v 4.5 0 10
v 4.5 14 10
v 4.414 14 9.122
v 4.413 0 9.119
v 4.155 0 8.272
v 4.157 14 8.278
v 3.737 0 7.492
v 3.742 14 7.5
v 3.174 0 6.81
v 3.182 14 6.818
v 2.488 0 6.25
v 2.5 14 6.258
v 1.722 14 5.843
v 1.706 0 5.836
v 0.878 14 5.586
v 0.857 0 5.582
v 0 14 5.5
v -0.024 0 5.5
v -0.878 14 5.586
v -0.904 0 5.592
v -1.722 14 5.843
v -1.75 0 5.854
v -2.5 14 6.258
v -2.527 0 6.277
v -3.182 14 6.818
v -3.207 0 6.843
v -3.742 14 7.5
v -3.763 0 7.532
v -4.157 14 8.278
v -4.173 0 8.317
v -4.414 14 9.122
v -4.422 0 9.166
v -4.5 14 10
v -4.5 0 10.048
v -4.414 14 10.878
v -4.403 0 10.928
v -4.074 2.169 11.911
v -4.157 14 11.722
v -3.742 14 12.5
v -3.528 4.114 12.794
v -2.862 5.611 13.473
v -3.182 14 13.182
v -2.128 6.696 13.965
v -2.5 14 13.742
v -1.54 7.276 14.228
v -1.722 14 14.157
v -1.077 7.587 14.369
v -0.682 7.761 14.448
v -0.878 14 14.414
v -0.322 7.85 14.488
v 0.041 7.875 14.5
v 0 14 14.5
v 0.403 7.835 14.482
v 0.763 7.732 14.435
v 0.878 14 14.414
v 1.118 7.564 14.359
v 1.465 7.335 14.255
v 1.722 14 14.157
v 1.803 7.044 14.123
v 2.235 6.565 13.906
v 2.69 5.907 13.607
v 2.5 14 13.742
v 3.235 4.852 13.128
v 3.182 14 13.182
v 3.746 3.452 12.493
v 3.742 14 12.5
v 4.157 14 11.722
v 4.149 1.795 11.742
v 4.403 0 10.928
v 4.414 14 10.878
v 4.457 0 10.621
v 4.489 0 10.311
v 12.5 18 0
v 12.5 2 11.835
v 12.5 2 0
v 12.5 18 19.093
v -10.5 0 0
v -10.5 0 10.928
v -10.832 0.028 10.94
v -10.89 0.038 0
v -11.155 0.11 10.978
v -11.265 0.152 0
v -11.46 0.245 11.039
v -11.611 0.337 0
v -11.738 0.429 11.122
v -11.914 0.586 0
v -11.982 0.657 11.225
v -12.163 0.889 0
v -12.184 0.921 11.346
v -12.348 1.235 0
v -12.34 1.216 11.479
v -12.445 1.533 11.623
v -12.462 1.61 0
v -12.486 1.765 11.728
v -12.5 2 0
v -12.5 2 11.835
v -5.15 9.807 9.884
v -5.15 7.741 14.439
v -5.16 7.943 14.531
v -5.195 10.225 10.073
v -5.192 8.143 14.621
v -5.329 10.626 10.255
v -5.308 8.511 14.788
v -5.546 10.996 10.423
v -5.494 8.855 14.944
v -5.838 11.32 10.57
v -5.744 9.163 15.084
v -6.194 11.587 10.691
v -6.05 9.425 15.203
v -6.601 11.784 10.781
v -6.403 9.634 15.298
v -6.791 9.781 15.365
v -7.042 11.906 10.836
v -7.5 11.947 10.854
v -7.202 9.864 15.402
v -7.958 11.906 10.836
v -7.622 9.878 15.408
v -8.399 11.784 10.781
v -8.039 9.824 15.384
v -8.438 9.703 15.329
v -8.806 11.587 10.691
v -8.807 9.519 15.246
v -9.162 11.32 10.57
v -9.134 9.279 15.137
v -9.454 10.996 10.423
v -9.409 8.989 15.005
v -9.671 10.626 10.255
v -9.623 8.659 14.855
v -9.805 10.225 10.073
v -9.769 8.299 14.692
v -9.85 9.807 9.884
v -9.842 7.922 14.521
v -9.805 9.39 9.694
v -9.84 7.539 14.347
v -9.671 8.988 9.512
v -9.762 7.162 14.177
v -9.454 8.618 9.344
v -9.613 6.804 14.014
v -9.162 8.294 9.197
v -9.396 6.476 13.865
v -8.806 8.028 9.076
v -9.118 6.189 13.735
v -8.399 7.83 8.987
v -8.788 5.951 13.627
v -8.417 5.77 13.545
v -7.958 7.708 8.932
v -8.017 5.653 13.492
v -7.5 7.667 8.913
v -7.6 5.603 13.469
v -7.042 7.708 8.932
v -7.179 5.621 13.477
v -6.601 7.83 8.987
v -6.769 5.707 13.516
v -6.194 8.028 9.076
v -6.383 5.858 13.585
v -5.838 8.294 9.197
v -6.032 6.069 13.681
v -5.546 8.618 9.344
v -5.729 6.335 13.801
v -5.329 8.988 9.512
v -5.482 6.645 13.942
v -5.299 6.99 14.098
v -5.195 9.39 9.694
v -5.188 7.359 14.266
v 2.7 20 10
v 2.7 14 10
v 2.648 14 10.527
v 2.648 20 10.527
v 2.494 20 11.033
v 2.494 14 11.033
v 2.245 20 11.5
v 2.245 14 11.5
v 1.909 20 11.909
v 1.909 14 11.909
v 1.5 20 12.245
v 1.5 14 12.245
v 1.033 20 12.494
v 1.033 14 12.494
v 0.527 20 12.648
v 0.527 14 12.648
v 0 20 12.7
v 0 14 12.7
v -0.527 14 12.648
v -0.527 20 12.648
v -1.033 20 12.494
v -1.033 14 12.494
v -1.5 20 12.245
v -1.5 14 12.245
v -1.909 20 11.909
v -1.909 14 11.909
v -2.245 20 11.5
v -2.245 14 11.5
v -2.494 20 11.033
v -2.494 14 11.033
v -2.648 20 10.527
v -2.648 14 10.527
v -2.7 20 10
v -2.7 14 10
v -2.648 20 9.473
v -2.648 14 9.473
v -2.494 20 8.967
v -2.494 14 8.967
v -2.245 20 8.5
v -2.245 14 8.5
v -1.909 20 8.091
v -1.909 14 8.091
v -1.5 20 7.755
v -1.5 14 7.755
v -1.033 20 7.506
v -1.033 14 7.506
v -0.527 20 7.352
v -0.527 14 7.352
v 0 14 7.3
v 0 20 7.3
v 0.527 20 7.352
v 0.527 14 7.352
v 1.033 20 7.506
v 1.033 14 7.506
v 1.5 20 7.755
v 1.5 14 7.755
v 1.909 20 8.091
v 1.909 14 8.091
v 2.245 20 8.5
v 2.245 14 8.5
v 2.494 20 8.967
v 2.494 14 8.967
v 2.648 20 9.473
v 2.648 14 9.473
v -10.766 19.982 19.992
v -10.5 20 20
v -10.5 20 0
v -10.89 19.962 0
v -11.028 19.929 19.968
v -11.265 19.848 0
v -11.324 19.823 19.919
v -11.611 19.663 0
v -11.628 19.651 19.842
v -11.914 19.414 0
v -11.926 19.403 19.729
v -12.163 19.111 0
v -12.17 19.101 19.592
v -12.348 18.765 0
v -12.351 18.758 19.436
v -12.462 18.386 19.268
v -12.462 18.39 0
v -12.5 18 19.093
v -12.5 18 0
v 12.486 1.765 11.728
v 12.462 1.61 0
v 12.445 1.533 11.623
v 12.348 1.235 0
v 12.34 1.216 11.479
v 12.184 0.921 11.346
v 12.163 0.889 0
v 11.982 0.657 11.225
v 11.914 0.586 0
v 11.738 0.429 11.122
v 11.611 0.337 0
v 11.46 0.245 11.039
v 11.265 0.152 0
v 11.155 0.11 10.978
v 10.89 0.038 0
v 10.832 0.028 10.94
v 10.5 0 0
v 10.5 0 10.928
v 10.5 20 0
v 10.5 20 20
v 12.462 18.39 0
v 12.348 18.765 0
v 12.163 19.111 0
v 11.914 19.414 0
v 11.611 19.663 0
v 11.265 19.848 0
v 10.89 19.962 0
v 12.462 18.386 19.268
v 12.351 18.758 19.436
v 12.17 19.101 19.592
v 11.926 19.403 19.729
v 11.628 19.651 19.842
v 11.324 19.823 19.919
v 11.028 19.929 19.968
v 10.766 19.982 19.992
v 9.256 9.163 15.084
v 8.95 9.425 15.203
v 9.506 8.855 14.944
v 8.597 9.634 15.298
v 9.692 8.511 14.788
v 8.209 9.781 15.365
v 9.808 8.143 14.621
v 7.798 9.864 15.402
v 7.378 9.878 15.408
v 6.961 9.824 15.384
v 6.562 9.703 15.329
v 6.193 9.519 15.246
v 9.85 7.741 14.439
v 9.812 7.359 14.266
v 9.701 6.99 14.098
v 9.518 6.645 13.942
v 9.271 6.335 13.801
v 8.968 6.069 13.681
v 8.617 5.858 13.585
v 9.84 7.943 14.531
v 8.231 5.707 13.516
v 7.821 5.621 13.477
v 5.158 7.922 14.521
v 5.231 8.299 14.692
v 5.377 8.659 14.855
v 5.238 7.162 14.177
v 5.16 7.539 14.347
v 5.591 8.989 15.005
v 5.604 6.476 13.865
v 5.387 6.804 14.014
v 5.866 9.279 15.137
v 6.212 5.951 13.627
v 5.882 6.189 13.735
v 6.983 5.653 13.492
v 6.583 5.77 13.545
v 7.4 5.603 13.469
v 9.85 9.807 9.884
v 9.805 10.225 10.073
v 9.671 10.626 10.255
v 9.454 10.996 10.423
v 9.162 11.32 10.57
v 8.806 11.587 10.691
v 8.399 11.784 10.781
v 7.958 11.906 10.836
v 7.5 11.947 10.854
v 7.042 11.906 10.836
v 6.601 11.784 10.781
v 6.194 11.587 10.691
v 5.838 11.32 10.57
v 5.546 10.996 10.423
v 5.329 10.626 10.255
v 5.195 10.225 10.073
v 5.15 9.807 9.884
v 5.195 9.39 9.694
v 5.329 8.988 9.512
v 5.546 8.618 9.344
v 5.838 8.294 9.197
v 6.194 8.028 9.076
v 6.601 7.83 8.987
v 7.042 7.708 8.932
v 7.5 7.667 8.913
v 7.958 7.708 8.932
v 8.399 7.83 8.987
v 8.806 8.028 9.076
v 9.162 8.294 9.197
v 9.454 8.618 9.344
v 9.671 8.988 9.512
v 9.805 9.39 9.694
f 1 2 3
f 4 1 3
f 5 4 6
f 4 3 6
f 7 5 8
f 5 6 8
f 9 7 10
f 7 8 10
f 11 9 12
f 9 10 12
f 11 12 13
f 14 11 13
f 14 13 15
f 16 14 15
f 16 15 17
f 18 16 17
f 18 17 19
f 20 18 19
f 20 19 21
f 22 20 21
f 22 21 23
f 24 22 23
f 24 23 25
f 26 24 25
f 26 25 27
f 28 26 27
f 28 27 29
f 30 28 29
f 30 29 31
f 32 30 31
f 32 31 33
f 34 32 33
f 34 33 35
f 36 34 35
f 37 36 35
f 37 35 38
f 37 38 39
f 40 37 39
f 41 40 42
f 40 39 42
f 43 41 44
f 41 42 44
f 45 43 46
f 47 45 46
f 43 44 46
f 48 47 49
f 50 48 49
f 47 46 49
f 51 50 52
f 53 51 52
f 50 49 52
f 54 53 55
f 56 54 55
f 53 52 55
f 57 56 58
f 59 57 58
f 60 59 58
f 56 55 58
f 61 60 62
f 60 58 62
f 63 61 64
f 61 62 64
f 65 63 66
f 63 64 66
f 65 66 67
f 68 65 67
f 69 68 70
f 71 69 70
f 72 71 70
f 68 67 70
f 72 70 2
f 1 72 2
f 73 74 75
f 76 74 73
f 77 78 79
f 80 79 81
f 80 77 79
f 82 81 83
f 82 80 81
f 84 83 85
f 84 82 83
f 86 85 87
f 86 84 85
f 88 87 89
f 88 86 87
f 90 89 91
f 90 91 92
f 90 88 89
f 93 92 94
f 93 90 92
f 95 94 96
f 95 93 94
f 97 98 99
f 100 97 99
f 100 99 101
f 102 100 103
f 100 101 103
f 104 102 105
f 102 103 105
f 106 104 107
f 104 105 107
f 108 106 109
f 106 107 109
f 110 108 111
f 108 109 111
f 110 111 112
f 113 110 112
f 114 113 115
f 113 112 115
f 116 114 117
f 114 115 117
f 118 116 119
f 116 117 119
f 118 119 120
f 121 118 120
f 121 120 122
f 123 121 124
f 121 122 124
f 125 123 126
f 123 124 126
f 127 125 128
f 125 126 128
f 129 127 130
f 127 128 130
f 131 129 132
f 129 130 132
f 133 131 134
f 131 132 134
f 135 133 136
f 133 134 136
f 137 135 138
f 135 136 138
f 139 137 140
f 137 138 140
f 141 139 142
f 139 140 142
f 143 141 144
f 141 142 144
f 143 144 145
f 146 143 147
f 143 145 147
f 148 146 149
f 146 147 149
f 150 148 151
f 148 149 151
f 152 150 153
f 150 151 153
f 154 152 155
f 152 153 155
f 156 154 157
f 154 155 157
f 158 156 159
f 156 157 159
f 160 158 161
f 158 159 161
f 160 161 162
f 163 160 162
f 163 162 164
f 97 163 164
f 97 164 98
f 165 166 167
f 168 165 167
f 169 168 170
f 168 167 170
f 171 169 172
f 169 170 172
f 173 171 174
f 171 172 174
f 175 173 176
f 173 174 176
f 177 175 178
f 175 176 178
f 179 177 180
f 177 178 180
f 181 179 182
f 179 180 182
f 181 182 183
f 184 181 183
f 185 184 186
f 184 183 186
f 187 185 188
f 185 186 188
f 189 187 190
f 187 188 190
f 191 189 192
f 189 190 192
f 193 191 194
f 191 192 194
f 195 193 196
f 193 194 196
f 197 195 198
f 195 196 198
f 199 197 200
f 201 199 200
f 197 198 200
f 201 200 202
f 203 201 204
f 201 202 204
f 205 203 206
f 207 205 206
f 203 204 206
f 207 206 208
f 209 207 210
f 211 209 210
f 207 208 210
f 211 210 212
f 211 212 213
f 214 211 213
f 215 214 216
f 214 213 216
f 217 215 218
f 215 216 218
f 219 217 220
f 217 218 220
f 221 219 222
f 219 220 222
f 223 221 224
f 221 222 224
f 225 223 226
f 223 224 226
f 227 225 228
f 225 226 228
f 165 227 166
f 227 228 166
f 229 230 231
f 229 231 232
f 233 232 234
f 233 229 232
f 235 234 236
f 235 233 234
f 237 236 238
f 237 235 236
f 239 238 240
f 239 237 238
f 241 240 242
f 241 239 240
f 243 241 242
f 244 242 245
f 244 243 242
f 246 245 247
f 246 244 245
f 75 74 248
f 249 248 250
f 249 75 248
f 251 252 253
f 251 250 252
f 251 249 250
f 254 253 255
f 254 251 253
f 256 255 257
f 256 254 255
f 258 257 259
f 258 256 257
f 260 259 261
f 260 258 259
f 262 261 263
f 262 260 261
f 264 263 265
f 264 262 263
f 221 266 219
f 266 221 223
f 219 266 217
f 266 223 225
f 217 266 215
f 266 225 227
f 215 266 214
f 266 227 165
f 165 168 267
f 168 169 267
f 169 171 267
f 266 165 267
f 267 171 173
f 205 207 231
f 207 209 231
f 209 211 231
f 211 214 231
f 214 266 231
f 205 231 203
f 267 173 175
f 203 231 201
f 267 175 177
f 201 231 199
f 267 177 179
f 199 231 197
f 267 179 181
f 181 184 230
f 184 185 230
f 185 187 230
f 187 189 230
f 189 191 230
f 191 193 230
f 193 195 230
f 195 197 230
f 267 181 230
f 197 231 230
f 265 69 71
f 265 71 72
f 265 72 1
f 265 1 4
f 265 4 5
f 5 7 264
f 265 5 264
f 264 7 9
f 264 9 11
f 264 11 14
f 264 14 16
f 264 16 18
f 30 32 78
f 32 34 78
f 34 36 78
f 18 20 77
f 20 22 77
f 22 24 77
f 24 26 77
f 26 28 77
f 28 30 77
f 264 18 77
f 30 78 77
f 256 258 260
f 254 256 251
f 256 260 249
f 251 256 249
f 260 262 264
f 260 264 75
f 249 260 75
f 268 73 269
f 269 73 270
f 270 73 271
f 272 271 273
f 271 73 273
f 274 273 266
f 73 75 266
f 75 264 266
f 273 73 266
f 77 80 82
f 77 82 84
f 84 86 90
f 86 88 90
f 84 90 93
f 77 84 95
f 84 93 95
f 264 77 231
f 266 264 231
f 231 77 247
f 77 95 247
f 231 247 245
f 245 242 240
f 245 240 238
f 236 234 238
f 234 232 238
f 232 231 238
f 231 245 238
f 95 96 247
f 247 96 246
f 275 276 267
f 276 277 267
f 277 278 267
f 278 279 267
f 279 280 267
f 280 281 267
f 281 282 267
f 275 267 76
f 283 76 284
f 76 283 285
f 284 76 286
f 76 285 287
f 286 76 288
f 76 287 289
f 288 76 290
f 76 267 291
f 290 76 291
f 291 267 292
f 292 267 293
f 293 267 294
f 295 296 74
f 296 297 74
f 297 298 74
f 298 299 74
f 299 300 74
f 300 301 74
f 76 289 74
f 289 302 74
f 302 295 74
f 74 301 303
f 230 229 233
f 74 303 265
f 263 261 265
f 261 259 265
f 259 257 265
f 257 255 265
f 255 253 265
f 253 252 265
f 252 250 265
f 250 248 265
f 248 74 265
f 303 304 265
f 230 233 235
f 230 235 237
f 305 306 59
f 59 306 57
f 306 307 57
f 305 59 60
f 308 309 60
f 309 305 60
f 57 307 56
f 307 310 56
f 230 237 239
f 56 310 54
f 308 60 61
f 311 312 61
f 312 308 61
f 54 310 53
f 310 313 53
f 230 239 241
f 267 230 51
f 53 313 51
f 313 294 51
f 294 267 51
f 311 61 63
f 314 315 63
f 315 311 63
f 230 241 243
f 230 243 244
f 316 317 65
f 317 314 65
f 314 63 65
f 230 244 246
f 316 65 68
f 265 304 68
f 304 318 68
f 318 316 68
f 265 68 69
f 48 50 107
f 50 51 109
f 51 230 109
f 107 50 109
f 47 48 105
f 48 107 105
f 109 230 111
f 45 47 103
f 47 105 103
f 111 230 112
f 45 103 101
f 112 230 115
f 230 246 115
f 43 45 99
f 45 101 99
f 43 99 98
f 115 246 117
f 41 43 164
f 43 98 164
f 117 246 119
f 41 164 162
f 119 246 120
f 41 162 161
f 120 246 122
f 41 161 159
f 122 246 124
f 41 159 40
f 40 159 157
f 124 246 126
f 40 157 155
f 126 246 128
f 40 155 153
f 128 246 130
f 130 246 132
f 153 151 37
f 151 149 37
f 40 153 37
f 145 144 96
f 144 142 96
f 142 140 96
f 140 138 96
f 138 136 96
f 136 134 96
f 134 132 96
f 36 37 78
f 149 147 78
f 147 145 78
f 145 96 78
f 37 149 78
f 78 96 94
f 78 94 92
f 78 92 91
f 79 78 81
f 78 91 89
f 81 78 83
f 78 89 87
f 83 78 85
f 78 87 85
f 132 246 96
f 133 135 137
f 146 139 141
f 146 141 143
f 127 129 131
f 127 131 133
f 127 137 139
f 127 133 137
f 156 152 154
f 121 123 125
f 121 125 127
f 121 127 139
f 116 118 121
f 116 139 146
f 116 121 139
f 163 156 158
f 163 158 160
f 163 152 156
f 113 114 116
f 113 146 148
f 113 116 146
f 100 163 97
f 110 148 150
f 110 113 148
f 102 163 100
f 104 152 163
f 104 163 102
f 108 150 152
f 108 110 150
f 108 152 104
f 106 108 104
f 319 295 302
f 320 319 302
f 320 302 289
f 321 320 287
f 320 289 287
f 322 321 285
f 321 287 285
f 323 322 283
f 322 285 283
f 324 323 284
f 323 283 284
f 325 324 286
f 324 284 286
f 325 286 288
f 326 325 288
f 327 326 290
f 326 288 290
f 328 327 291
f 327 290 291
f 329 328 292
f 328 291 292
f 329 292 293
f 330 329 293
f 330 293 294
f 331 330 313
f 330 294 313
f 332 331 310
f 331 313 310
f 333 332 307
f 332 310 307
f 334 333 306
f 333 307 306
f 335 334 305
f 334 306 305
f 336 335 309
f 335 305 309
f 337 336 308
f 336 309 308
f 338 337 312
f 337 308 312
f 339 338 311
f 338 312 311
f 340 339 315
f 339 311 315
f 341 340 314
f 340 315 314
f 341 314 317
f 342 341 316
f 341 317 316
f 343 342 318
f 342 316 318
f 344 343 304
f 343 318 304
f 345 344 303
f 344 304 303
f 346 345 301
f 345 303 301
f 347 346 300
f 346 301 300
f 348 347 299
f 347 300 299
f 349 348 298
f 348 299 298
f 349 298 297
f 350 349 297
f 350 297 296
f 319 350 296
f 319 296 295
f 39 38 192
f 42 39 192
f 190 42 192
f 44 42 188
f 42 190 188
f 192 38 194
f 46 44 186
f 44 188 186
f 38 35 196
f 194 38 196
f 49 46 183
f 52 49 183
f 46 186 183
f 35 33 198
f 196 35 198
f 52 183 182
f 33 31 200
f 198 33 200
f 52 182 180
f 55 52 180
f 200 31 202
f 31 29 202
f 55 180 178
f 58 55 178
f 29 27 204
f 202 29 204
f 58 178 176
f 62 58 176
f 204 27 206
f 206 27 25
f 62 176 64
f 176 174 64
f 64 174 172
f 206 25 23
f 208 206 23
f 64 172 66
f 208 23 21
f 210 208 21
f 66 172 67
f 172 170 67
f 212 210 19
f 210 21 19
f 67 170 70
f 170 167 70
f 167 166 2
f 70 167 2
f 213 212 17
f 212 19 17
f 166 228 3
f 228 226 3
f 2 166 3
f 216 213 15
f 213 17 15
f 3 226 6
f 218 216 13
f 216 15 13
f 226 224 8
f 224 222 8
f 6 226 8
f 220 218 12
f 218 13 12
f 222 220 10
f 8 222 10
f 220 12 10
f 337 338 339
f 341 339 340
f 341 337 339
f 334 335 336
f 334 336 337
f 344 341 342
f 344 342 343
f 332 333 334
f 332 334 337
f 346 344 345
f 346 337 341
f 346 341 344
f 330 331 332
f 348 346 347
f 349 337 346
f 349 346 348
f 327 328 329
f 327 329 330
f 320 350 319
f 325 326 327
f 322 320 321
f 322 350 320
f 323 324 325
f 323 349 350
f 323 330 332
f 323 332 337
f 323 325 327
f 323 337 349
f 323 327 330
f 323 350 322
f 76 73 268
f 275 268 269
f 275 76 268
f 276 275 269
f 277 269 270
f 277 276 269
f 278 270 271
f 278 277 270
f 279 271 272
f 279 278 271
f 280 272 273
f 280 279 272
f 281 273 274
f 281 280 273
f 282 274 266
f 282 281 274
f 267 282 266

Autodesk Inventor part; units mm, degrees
ref_plane "YZ Plane" through (0, 0, 0) normal (1, 0, 0) x (0, 1, 0)
ref_plane "XZ Plane" through (0, 0, 0) normal (0, 1, 0) x (-1, 0, 0)
sketch "Skizze1" plane through (0, 0, 0) normal (1, 0, 0) x (0, 1, 0)
  line L0 (0, 0) -> (20, 0)
  line L1 (20, 0) -> (20, 20)
  line L2 (20, 20) -> (0, 10.9276)
  line L3 (0, 10.9276) -> (0, 0)
  dimension "d0" = 20
  dimension "d2" = 24.4
  dimension "d18" = 20
extrude "Extrusion1" add sketch "Skizze1" along normal mid plane 25
sketch "Skizze2" plane through (-12.5, 0, 10.9276) normal (0, -0.4131, 0.9107) x (1, 0, 0)
  line L0 (0, 0) -> (0, 21.9615) projected
  line L1 (0, 21.9615) -> (25, 21.9615) projected
  line L2 (25, 21.9615) -> (25, 0) projected
  line L3 (25, 0) -> (0, 0) projected
  line L4 (0, 21.9615) -> (25, 21.9615) projected
  line L5 (12.5, 21.9615) -> (12.5, 0) construction
  line L6 (0, 0) -> (25, 0) projected
  circle A0 centre (5, 8.5) radius 2.35
  circle A1 centre (20, 8.5) radius 2.35
  point P0 (12.5, -4.5142)
  dimension "d5" = 4.7
  dimension "d6" = 15
  dimension "d7" = 8.5
extrude "Extrusion2" cut sketch "Skizze2" against normal blind 5 contours A0 | A1
ref_plane "Arbeitsebene3" through (-12.5, 14, 20) normal (0, 1, 0) x (1, 0, 0)
sketch "Skizze5" plane through (-12.5, 14, 20) normal (0, 1, 0) x (1, 0, 0)
  line L0 (0, 0) -> (25, 0) projected
  line L1 (25, 20) -> (25, 0) projected
  line L2 (25, 20) -> (0, 20) projected
  line L3 (0, 0) -> (0, 20) projected
  line L4 (12.5, 0) -> (12.5, 20) construction
  line L5 (0, 10) -> (25, 10) construction
  circle A0 centre (12.5, 10) radius 2.7
  circle A1 centre (12.5, 10) radius 4.5
  dimension "d20" = 5.4
  dimension "d21" = 9
extrude "Extrusion5" cut sketch "Skizze5" along normal through all contours A0
extrude "Extrusion6" cut sketch "Skizze5" against normal through all contours A0 | A1
fillet "Rundung1" radius 2 4 edges at (12.5, 0, 5.4638) (12.5, 20, 10) (-12.5, 0, 5.4638) (-12.5, 20, 10)
properties part number "Camera-Mount" material "ABS-Kunststoff"
